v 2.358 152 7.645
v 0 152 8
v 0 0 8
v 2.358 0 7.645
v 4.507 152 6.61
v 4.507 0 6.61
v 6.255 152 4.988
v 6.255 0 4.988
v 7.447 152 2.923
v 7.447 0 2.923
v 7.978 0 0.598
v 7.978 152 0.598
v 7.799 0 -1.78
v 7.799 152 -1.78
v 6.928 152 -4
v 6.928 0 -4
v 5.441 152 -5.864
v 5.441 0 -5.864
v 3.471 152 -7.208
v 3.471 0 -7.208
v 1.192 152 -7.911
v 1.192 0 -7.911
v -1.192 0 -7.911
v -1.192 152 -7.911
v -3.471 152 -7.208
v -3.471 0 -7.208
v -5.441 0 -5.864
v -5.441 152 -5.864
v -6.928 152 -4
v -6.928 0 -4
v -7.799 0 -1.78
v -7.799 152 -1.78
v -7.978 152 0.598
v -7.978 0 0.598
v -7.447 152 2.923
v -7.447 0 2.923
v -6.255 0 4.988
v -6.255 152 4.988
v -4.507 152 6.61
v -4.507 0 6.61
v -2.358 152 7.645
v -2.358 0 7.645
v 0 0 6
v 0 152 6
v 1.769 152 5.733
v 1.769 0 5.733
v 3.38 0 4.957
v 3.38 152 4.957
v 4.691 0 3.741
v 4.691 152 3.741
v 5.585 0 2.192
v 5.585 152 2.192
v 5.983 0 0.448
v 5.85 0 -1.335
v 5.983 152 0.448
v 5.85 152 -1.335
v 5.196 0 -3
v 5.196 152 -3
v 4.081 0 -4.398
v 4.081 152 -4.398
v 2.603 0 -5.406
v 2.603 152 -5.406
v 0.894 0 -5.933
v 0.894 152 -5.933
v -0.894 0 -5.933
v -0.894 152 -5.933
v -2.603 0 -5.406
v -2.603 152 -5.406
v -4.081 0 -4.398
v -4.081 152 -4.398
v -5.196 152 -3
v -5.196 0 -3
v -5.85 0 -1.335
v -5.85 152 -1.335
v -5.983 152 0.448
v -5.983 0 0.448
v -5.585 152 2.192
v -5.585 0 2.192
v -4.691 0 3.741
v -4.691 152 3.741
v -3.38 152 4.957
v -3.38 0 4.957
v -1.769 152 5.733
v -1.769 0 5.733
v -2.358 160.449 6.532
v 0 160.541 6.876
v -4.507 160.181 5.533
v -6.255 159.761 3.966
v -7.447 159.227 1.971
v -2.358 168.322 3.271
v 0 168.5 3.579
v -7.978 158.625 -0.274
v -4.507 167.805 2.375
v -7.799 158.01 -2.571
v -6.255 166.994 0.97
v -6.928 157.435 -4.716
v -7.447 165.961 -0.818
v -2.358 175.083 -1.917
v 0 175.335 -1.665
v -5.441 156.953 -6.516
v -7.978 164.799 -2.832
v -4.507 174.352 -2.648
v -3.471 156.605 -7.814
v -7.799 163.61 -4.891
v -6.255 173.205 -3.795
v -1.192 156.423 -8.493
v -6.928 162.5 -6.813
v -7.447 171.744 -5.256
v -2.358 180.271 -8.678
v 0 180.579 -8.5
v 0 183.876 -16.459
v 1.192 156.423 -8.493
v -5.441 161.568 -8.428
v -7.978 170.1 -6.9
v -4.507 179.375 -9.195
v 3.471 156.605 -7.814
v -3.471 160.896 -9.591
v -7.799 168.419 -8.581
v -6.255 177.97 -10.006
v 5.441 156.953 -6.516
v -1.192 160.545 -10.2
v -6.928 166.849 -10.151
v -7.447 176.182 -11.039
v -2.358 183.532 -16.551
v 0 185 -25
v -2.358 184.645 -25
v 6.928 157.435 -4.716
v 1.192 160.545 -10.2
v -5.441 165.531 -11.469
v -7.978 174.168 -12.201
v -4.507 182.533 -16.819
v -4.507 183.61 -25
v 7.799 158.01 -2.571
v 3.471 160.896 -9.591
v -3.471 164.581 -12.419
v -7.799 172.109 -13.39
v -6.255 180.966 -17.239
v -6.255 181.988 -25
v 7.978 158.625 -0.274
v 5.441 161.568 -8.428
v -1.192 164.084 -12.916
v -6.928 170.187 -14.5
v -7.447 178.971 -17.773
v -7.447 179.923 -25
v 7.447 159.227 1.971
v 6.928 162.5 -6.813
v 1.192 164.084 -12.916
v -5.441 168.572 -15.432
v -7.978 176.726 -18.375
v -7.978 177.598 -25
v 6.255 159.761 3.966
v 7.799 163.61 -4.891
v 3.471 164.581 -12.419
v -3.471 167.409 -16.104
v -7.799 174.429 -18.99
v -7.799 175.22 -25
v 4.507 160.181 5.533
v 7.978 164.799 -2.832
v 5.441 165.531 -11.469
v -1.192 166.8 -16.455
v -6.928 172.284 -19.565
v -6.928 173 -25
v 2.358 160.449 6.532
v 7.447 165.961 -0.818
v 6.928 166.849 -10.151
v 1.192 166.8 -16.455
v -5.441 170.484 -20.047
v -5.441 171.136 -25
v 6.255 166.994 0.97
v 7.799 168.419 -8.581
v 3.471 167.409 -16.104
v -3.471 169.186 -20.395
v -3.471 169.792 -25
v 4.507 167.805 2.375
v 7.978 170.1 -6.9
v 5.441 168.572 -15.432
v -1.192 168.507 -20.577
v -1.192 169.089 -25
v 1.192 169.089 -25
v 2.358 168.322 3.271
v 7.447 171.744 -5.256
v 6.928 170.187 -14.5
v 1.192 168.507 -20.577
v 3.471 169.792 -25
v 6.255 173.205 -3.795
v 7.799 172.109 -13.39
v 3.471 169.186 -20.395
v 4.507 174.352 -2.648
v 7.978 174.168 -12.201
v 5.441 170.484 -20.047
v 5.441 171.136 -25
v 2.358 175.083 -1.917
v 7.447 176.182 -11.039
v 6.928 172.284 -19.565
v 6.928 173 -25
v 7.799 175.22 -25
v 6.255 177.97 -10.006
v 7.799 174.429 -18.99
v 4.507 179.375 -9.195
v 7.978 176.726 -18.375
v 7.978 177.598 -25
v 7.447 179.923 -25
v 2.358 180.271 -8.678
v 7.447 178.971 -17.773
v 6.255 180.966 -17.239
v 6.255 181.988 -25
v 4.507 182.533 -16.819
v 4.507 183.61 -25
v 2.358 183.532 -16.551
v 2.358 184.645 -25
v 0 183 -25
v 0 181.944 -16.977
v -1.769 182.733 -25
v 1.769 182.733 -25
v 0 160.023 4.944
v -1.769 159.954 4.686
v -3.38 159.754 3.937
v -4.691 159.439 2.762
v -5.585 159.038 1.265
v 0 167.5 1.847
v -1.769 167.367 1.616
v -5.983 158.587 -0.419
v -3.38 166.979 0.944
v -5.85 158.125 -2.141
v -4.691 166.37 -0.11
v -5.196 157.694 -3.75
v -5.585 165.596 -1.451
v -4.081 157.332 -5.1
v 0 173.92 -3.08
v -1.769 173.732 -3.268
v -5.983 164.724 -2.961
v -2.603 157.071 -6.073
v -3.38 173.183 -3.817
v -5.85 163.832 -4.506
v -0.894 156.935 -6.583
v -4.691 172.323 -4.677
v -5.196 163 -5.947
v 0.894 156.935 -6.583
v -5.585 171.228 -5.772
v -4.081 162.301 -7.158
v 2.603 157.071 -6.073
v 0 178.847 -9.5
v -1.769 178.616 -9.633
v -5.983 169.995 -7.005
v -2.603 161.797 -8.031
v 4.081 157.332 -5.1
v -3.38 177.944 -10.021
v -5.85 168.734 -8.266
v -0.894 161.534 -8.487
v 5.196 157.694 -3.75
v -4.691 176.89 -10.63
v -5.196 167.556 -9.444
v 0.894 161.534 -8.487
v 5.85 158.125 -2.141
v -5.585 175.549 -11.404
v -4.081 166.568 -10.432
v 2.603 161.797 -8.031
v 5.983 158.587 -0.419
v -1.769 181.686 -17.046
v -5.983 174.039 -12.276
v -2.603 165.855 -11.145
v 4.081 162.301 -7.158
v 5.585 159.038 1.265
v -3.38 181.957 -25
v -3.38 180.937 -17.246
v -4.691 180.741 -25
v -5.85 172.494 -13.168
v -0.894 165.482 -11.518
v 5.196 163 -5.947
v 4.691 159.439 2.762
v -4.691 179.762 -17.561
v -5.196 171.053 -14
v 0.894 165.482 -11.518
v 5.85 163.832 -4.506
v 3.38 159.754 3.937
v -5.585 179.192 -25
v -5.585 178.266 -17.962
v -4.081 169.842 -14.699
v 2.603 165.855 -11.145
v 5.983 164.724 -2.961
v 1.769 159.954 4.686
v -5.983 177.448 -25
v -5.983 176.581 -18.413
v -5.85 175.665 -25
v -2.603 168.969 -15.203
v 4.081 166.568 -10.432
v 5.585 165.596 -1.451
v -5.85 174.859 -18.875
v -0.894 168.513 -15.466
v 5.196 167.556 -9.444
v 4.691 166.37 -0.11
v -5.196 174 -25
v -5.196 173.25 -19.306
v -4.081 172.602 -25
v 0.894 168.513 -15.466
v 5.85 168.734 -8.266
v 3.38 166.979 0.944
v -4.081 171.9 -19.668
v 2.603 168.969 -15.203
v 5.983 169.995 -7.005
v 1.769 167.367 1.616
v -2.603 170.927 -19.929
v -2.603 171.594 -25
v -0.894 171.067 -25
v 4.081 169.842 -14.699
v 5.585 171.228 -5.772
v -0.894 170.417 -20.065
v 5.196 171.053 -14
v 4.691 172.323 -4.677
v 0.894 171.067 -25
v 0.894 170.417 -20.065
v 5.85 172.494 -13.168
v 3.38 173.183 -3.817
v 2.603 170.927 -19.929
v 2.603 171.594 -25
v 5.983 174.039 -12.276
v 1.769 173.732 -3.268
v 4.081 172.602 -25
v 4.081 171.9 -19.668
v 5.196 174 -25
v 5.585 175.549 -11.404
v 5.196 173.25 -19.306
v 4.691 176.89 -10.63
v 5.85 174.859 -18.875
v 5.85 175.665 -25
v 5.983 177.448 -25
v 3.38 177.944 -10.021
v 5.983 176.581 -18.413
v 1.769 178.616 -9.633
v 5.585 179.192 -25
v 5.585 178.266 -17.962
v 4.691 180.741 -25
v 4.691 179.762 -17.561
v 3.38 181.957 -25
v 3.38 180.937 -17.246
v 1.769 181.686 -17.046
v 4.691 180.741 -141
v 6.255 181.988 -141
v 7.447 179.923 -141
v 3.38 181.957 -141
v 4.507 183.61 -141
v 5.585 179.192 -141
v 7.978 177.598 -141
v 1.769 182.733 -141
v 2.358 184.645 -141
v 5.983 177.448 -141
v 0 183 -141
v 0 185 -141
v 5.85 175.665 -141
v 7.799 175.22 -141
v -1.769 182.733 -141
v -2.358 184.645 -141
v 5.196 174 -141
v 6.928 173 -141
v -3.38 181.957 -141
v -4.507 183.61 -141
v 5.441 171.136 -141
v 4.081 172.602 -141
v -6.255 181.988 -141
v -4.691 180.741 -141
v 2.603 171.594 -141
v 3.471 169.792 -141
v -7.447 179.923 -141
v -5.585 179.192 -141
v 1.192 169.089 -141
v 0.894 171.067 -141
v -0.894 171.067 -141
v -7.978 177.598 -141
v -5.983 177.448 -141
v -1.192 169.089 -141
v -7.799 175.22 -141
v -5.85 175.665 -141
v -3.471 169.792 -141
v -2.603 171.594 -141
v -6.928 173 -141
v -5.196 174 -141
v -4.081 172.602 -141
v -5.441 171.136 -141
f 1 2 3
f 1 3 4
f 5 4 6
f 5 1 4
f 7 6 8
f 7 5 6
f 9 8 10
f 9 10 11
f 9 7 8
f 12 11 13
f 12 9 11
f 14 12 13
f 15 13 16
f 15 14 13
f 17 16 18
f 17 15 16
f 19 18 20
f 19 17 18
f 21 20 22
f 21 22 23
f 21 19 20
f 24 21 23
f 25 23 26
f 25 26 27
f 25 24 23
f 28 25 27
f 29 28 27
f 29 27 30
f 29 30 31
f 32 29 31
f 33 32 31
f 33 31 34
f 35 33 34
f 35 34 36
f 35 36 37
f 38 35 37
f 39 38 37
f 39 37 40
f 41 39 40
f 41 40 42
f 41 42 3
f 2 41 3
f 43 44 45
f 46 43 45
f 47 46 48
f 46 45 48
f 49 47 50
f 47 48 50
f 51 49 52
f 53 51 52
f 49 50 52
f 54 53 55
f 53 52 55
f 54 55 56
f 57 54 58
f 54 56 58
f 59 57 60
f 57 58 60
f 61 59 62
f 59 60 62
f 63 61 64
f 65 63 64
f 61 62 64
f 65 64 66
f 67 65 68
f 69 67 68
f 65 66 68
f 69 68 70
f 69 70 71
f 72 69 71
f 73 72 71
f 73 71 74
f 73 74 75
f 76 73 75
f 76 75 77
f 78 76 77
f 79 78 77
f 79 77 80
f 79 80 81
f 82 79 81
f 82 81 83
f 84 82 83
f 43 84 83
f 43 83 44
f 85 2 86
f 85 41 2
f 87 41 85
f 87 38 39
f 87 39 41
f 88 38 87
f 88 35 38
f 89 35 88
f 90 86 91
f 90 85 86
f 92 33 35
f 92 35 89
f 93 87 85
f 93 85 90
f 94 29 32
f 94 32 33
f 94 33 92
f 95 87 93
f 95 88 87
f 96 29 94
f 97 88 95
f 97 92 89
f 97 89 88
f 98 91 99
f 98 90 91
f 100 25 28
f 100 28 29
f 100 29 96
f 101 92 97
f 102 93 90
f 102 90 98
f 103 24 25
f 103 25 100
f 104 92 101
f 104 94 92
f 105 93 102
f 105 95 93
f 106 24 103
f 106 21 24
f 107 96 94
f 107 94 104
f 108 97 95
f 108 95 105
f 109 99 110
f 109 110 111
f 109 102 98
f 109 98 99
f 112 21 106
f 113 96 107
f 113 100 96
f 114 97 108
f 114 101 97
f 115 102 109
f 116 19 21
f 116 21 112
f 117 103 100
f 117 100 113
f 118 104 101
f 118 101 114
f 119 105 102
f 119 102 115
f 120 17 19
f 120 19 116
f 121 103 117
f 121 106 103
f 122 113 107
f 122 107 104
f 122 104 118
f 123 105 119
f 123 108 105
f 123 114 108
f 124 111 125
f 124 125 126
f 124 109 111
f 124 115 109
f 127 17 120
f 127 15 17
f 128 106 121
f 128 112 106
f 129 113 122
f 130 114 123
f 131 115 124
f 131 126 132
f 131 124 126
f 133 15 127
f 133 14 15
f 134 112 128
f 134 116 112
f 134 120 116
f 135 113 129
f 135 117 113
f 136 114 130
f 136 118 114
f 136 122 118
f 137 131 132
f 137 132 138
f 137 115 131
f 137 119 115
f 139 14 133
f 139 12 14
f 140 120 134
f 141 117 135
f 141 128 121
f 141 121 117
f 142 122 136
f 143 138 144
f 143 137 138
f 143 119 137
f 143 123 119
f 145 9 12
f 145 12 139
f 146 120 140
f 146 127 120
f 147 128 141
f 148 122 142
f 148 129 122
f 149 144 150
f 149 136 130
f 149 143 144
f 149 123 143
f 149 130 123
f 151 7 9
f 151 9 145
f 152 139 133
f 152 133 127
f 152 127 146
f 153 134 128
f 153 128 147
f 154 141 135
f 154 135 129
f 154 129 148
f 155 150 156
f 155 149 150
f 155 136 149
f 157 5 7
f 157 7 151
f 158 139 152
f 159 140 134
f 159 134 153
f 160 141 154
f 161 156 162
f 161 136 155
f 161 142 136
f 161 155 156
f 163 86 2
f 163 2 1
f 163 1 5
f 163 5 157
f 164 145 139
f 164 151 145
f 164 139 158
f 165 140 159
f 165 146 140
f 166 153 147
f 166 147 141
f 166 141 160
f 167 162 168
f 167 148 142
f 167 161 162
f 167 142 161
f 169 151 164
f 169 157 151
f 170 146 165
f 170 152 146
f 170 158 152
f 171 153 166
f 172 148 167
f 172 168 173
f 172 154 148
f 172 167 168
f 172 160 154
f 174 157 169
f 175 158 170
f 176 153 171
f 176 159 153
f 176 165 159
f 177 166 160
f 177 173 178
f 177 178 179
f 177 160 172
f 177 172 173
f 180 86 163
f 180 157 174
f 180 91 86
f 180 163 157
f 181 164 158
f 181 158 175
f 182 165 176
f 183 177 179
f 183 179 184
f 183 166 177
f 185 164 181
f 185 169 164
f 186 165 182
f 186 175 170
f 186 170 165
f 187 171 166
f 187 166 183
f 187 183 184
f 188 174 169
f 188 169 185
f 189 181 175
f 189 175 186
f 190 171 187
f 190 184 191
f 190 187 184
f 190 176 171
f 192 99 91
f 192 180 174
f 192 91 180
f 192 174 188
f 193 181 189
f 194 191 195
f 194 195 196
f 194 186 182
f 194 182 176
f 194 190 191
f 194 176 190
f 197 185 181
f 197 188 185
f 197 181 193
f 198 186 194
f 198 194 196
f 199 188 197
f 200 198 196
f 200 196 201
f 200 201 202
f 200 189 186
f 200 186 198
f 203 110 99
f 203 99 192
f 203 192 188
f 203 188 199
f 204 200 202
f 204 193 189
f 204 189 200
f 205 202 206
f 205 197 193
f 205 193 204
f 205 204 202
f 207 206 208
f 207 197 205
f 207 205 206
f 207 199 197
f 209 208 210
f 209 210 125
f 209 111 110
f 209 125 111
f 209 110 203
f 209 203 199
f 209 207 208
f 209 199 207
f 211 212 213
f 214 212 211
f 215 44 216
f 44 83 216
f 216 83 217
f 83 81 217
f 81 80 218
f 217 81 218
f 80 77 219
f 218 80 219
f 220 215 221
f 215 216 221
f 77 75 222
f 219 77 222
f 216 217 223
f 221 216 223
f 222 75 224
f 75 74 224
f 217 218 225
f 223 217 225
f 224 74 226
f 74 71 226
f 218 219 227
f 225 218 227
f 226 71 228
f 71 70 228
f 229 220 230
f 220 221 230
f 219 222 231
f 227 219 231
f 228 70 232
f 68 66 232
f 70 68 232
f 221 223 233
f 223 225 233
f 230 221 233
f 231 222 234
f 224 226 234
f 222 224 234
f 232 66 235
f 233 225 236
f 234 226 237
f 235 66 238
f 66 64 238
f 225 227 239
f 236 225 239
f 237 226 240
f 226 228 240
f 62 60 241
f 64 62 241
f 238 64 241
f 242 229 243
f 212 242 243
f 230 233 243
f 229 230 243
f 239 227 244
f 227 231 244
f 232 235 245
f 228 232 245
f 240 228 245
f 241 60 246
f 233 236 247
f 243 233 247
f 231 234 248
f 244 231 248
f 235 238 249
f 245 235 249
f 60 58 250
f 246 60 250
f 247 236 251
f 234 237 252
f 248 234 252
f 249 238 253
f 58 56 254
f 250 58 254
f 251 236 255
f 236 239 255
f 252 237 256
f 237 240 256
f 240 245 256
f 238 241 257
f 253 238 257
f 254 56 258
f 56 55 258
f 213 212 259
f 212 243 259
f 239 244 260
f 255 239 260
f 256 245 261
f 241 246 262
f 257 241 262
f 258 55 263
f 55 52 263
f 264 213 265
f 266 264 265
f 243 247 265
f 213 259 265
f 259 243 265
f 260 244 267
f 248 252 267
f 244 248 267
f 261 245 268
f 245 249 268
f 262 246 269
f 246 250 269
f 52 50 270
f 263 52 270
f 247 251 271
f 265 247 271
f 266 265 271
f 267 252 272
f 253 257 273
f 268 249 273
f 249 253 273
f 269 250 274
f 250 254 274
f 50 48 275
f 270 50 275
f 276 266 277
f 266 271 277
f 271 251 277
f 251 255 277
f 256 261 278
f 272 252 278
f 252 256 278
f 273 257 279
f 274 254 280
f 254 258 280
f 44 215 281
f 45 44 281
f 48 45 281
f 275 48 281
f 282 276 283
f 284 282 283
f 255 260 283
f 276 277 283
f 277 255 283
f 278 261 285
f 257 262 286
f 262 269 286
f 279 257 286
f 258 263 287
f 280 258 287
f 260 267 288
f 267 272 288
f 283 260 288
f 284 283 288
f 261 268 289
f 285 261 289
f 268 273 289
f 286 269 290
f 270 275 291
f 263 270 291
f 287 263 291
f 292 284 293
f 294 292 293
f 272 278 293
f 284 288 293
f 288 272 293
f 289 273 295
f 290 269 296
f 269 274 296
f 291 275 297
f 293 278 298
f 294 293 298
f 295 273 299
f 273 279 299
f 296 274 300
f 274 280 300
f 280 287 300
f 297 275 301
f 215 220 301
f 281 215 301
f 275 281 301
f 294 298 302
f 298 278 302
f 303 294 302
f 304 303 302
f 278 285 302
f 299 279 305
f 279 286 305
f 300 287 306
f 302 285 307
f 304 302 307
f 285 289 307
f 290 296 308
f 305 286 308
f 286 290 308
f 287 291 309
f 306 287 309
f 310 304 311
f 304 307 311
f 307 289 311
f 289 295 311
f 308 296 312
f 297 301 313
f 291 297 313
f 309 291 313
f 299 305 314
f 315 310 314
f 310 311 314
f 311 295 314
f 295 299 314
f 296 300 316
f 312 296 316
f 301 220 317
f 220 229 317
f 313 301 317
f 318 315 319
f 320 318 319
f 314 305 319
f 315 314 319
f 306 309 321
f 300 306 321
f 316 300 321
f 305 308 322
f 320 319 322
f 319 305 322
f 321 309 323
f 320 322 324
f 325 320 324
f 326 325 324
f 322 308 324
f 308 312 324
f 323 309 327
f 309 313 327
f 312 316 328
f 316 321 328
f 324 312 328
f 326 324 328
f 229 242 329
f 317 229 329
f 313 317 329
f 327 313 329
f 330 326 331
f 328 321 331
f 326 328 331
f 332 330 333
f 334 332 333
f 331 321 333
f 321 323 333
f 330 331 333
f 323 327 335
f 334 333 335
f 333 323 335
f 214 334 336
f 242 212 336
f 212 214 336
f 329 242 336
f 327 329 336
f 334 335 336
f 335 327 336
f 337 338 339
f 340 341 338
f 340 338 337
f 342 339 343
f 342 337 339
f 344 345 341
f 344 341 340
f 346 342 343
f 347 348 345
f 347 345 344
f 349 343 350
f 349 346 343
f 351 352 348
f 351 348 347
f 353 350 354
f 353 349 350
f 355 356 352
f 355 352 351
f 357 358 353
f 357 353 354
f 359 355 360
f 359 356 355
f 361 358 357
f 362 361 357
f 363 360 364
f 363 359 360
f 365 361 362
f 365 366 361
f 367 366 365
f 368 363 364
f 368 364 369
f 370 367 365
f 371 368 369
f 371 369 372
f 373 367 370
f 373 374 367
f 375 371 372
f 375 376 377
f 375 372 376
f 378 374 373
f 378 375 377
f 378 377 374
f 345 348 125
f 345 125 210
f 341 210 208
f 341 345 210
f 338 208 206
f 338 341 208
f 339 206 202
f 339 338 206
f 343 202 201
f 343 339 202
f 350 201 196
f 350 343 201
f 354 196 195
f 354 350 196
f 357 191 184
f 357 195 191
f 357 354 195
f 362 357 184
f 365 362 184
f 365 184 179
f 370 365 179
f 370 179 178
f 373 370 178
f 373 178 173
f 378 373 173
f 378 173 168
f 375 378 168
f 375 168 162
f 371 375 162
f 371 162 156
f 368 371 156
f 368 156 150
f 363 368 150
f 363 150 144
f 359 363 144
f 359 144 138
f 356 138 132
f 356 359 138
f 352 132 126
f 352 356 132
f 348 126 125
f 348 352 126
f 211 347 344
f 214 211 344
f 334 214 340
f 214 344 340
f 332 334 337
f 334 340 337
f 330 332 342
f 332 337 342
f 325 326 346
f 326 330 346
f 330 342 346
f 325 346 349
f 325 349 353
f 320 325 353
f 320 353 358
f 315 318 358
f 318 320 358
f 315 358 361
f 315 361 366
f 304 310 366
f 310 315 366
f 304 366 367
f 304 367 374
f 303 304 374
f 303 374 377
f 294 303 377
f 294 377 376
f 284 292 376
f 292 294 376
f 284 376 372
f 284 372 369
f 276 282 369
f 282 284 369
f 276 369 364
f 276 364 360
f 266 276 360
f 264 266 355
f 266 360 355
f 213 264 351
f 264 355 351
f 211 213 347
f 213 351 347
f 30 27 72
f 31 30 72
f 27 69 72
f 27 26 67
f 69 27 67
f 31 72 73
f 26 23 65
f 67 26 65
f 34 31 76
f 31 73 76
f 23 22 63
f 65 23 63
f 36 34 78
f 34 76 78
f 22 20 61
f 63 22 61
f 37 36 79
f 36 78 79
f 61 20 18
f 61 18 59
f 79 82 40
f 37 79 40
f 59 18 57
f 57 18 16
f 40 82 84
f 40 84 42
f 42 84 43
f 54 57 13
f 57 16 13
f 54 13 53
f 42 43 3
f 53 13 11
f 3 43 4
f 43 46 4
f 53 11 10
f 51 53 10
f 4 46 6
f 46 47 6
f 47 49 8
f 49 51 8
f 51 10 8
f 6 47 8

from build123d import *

# Parameters (mm, degrees)
SWEEP1_PROFILE_R                           = 8
HOLLOW_TUBE_OD_AND_WALL_PROVISIONAL_PROF_R = 6


with BuildPart() as part:
    # Sweep1: sweep along a curve in space
    with BuildLine() as sweep1_path:
        Line((0, 0, 0), (0, 152.000001606, 0))
        ThreePointArc((0, 152.000001606, 0), (0, 169.677670568, -7.322330568), (0, 177, -25))
        Line((0, 177, -25), (0, 177, -141))
    # Sweep1 profile (on start of the path) → Sweep1 (sweep)
    with BuildSketch(Plane.ZX):
        Circle(SWEEP1_PROFILE_R)
    sweep(path=sweep1_path.line)

    # Hollow_tube_OD_and_wall_PROVISIONAL: sweep along a curve in space
    with BuildLine() as hollow_tube_od_and_wall_provisional_path:
        Line((0, 0, 0), (0, 152.000001606, 0))
        ThreePointArc((0, 152.000001606, 0), (0, 169.677670568, -7.322330568), (0, 177, -25))
        Line((0, 177, -25), (0, 177, -141))
    # Hollow_tube_OD_and_wall_PROVISIONAL prof (on start of the path) → Hollow_tube_OD_and_wall_PROVISIONAL (sweep, cut)
    with BuildSketch(Plane.ZX):
        Circle(HOLLOW_TUBE_OD_AND_WALL_PROVISIONAL_PROF_R)
    sweep(path=hollow_tube_od_and_wall_provisional_path.line, mode=Mode.SUBTRACT)


solid = part.part
